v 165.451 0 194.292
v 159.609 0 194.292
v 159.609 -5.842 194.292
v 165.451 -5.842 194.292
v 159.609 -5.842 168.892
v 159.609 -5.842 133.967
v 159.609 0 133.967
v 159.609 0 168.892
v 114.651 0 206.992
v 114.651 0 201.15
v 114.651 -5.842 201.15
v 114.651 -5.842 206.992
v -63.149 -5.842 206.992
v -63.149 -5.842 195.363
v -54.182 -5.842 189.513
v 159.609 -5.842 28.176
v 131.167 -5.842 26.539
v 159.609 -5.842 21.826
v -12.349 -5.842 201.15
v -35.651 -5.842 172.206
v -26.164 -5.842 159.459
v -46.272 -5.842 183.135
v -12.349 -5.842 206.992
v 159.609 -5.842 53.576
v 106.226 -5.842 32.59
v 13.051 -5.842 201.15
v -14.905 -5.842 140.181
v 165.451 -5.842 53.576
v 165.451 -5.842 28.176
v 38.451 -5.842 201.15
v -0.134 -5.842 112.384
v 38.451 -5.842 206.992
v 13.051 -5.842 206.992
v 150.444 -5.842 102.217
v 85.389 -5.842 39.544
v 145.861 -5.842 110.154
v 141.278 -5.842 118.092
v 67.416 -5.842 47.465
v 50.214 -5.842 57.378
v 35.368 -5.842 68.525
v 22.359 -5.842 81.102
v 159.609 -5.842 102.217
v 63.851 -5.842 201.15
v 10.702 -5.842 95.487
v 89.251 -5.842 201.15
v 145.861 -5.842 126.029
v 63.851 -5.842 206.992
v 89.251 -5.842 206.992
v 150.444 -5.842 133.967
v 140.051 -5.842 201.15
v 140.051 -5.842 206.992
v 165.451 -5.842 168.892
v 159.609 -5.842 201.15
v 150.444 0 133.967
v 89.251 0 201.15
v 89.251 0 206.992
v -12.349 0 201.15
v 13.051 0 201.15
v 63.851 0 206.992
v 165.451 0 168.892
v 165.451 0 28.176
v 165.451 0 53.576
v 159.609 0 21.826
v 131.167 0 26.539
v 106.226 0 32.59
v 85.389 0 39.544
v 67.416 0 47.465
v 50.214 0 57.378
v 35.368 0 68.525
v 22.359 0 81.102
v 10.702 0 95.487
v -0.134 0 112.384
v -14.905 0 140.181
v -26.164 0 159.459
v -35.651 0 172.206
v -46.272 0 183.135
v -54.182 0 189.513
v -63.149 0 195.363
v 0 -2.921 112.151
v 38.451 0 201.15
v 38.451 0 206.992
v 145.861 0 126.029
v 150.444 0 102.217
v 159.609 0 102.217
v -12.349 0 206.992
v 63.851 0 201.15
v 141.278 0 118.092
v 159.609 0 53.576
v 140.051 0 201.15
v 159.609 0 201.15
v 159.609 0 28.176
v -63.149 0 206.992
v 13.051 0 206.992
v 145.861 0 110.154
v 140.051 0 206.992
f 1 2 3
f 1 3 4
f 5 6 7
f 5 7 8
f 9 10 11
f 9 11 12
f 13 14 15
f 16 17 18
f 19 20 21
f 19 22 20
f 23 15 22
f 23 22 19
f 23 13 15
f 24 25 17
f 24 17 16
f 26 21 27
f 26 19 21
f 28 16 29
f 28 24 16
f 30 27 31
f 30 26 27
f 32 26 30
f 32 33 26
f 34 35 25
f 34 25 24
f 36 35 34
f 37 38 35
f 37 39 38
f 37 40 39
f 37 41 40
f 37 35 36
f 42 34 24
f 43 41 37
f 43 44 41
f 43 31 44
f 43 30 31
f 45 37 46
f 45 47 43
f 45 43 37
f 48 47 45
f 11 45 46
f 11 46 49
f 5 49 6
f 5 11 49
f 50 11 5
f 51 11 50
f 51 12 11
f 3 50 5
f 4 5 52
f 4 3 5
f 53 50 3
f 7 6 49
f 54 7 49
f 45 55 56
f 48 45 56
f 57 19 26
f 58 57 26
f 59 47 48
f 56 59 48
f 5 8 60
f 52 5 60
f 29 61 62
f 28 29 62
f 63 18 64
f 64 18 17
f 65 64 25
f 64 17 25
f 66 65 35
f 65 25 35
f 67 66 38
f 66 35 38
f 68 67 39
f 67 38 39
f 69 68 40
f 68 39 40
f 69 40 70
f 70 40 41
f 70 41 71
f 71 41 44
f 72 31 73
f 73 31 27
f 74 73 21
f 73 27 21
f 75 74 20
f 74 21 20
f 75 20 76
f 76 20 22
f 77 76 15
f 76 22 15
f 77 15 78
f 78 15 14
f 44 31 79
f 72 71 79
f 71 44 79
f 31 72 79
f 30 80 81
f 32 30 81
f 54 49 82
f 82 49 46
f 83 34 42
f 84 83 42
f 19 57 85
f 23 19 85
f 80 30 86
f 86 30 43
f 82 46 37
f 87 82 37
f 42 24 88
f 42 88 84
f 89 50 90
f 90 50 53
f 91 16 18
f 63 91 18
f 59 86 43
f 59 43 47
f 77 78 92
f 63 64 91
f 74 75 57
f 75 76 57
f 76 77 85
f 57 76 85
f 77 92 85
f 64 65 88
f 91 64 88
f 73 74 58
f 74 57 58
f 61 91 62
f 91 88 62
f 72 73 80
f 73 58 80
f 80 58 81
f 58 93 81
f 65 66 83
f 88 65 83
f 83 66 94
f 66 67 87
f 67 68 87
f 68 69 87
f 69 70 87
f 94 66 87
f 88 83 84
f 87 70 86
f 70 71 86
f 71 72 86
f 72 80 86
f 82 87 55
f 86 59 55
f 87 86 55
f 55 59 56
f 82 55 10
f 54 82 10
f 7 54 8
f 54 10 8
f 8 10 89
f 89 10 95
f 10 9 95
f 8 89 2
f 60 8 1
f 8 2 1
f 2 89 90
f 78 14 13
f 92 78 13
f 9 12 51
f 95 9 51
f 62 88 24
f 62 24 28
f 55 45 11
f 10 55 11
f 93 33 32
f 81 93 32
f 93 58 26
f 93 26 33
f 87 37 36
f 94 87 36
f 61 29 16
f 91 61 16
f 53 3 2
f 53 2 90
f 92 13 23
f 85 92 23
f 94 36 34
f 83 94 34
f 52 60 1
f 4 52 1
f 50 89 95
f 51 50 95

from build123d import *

# Parameters (mm, degrees)
F0_W      = 279.4
F0_H      = 330.2
F1_DEPTH  = 5.842
F2_W      = 25.4
F2_H      = 5.842
F2_W_2    = 76.2
F2_W_3    = 5.842
F2_H_2    = 25.4
F2_H_3    = 38.1
F3_DEPTH  = 5.842
F5_W      = 5.842
F5_H      = 12.7
F6_DEPTH  = 5.842
F7_DEPTH  = 5.842
F8_W      = 5.842
F8_H      = 48.641
F8_H_2    = 34.925
F8_H_3    = 11.684
F9_DEPTH  = 5.842
F10_W     = 246.7240431406
F10_H     = 1.016
F11_DEPTH = 5.842
F12_W     = 25.4
F12_H     = 5.842
F12_W_2   = 19.558
F13_DEPTH = 5.842


with BuildPart() as f1:
    # F0 (on Front) → F1 (new body)
    with BuildSketch(Plane.XZ):
        with Locations((25.751306051, 40.8756073241)):
            Rectangle(F0_W, F0_H)
    extrude(amount=F1_DEPTH)

    # F2 (on face) → F3 (cut, through all)
    with BuildSketch(Plane.XZ.offset(5.842)):
        with Locations((152.751306051, -121.3033926759)):
            Rectangle(F2_W, F2_H)
        with Locations((101.951306051, -121.3033926759)):
            Rectangle(F2_W, F2_H)
        with Locations((51.151306051, -121.3033926759)):
            Rectangle(F2_W, F2_H)
        with Locations((0.351306051, -121.3033926759)):
            Rectangle(F2_W, F2_H)
        with Locations((-75.848693949, -121.3033926759)):
            Rectangle(F2_W_2, F2_H)
        with Locations((162.530306051, -86.1243926759)):
            Rectangle(F2_W_3, F2_H_2)
        with Locations((162.530306051, -28.9743926759)):
            Rectangle(F2_W_3, F2_H_3)
        with Locations((-111.027693949, -86.1243926759)):
            Rectangle(F2_W_3, F2_H_2)
        with Locations((-111.027693949, -35.3243926759)):
            Rectangle(F2_W_3, F2_H_2)
        with Locations((-111.027693949, 15.4756073241)):
            Rectangle(F2_W_3, F2_H_2)
        with Locations((-111.027693949, 66.2756073241)):
            Rectangle(F2_W_3, F2_H_2)
        with Locations((-111.027693949, 167.8756073241)):
            Rectangle(F2_W_3, F2_H_2)
        with Locations((-111.027693949, 117.0756073241)):
            Rectangle(F2_W_3, F2_H_2)
    extrude(amount=-F3_DEPTH, mode=Mode.SUBTRACT)

    # F5 (on face) → F6 (cut, through all)
    with BuildSketch(Plane.XZ.offset(5.842)):
        with Locations((162.530306051, 2.7756073241)):
            Rectangle(F5_W, F5_H)
    extrude(amount=-F6_DEPTH, mode=Mode.SUBTRACT)

    # F4 (on face) → F7 (cut, through all)
    with BuildSketch(Plane.XZ.offset(5.842)):
        with BuildLine():
            Line((165.451306051, 15.4756073241), (159.609306051, 15.4756073241))
            add(Edge.make_bspline(
                [(159.609306051, 15.4756073241), (73.376306051, 28.1756073241), (-24.3765935073, 60.3637718481), (-21.873693949, 193.2756073241), (-113.948693949, 205.9756073241)],
                knots=[0, 0, 0, 0, 0.507272, 1, 1, 1, 1], degree=3))
            Line((-113.948693949, 205.9756073241), (-113.948693949, 180.5756073241))
            Line((-113.948693949, 180.5756073241), (-108.106693949, 180.5756073241))
            Line((-108.106693949, 180.5756073241), (-108.106693949, 155.1756073241))
            Line((-108.106693949, 155.1756073241), (-113.948693949, 155.1756073241))
            Line((-113.948693949, 155.1756073241), (-113.948693949, 129.7756073241))
            Line((-113.948693949, 129.7756073241), (-108.106693949, 129.7756073241))
            Line((-108.106693949, 129.7756073241), (-108.106693949, 104.3756073241))
            Line((-108.106693949, 104.3756073241), (-113.948693949, 104.3756073241))
            Line((-113.948693949, 104.3756073241), (-113.948693949, 78.9756073241))
            Line((-113.948693949, 78.9756073241), (-108.106693949, 78.9756073241))
            Line((-108.106693949, 78.9756073241), (-108.106693949, 53.5756073241))
            Line((-108.106693949, 53.5756073241), (-113.948693949, 53.5756073241))
            Line((-113.948693949, 53.5756073241), (-113.948693949, 28.1756073241))
            Line((-113.948693949, 28.1756073241), (-108.106693949, 28.1756073241))
            Line((-108.106693949, 28.1756073241), (-108.106693949, 2.7756073241))
            Line((-108.106693949, 2.7756073241), (-113.948693949, 2.7756073241))
            Line((-113.948693949, 2.7756073241), (-113.948693949, -22.6243926759))
            Line((-113.948693949, -22.6243926759), (-108.106693949, -22.6243926759))
            Line((-108.106693949, -22.6243926759), (-108.106693949, -48.0243926759))
            Line((-108.106693949, -48.0243926759), (-113.948693949, -48.0243926759))
            Line((-113.948693949, -48.0243926759), (-113.948693949, -73.4243926759))
            Line((-113.948693949, -73.4243926759), (-108.106693949, -73.4243926759))
            Line((-108.106693949, -73.4243926759), (-108.106693949, -98.8243926759))
            Line((-108.106693949, -98.8243926759), (-113.948693949, -98.8243926759))
            Line((-113.948693949, -98.8243926759), (-113.948693949, -118.3823926759))
            Line((-113.948693949, -118.3823926759), (-37.748693949, -118.3823926759))
            Line((-37.748693949, -118.3823926759), (-37.748693949, -124.2243926759))
            Line((-37.748693949, -124.2243926759), (-12.348693949, -124.2243926759))
            Line((-12.348693949, -124.2243926759), (-12.348693949, -118.3823926759))
            Line((-12.348693949, -118.3823926759), (13.051306051, -118.3823926759))
            Line((13.051306051, -118.3823926759), (13.051306051, -124.2243926759))
            Line((13.051306051, -124.2243926759), (38.451306051, -124.2243926759))
            Line((38.451306051, -124.2243926759), (38.451306051, -118.3823926759))
            Line((38.451306051, -118.3823926759), (63.851306051, -118.3823926759))
            Line((63.851306051, -118.3823926759), (63.851306051, -124.2243926759))
            Line((63.851306051, -124.2243926759), (89.251306051, -124.2243926759))
            Line((89.251306051, -124.2243926759), (89.251306051, -118.3823926759))
            Line((89.251306051, -118.3823926759), (114.651306051, -118.3823926759))
            Line((114.651306051, -118.3823926759), (114.651306051, -124.2243926759))
            Line((114.651306051, -124.2243926759), (140.051306051, -124.2243926759))
            Line((140.051306051, -124.2243926759), (140.051306051, -118.3823926759))
            Line((140.051306051, -118.3823926759), (165.451306051, -118.3823926759))
            Line((165.451306051, -118.3823926759), (165.451306051, -98.8243926759))
            Line((165.451306051, -98.8243926759), (159.609306051, -98.8243926759))
            Line((159.609306051, -98.8243926759), (159.609306051, -73.4243926759))
            Line((159.609306051, -73.4243926759), (165.451306051, -73.4243926759))
            Line((165.451306051, -73.4243926759), (165.451306051, -48.0243926759))
            Line((165.451306051, -48.0243926759), (159.609306051, -48.0243926759))
            Line((159.609306051, -48.0243926759), (159.609306051, -9.9243926759))
            Line((159.609306051, -9.9243926759), (165.451306051, -9.9243926759))
            Line((165.451306051, -9.9243926759), (165.451306051, 15.4756073241))
        make_face()
        with BuildLine():
            add(Edge.make_bspline(
                [(159.609306051, 15.4756073241), (73.376306051, 28.1756073241), (-24.3765935073, 60.3637718481), (-21.873693949, 193.2756073241), (-113.948693949, 205.9756073241)],
                knots=[0, 0, 0, 0, 0.507272, 1, 1, 1, 1], degree=3))
            Line((159.609306051, 15.4756073241), (159.609306051, 21.8256073241))
            add(Edge.make_bspline(
                [(159.609306051, 21.8256073241), (63.851306051, 34.5256073241), (-5.6173037023, 95.4914607938), (-31.4644745687, 187.7697107475), (-87.114737086, 205.9756073241)],
                knots=[0, 0, 0, 0, 0.5236819738, 0.940243193, 0.940243193, 0.940243193, 0.940243193], degree=3))
            Line((-87.114737086, 205.9756073241), (-113.948693949, 205.9756073241))
        make_face()
    extrude(amount=-F7_DEPTH, mode=Mode.SUBTRACT)

    # F8 (on face) → F9 (cut, through all)
    with BuildSketch(Plane.XZ.offset(5.842)):
        Polygon((165.451306051, 15.4756073241), (165.451306051, 28.1756073241), (159.609306051, 28.1756073241), (159.609306051, 21.8256073241), (159.609306051, 15.4756073241), align=None)
        with Locations((162.530306051, 77.8961073241)):
            Rectangle(F8_W, F8_H)
        with BuildLine():
            Line((159.609306051, 102.2166073241), (165.451306051, 102.2166073241))
            Line((165.451306051, 102.2166073241), (165.451306051, 103.3306229057))
            ThreePointArc((165.451306051, 103.3306229057), (162.5829399691, 102.4975980153), (159.609306051, 102.2166073241))
        make_face()
        with BuildLine():
            ThreePointArc((145.861152343, 110.1541080567), (151.6718056847, 104.3434542505), (159.609306051, 102.2166073241))
            Line((159.609306051, 102.2166073241), (159.609306051, 133.9666073241))
            ThreePointArc((159.609306051, 133.9666073241), (151.6718056847, 131.8397603977), (145.861152343, 126.0291065915))
            ThreePointArc((145.861152343, 126.0291065915), (143.734306051, 118.0916073241), (145.861152343, 110.1541080567))
        make_face()
        with BuildLine():
            Line((150.4438705276, 102.2166073241), (159.609306051, 102.2166073241))
            ThreePointArc((159.609306051, 102.2166073241), (151.6718056847, 104.3434542505), (145.861152343, 110.1541080567))
            Line((145.861152343, 110.1541080567), (150.4438705276, 102.2166073241))
        make_face()
        with BuildLine():
            Line((159.609306051, 133.9666073241), (159.609306051, 102.2166073241))
            ThreePointArc((159.609306051, 102.2166073241), (162.5829399691, 102.4975980153), (165.451306051, 103.3306229057))
            Line((165.451306051, 103.3306229057), (165.451306051, 132.8525917425))
            ThreePointArc((165.451306051, 132.8525917425), (162.5829399691, 133.6856166328), (159.609306051, 133.9666073241))
        make_face()
        with BuildLine():
            Line((165.451306051, 133.9666073241), (159.609306051, 133.9666073241))
            ThreePointArc((159.609306051, 133.9666073241), (162.5829399691, 133.6856166328), (165.451306051, 132.8525917425))
            Line((165.451306051, 132.8525917425), (165.451306051, 133.9666073241))
        make_face()
        with BuildLine():
            ThreePointArc((145.861152343, 126.0291065915), (151.6718056847, 131.8397603977), (159.609306051, 133.9666073241))
            Line((159.609306051, 133.9666073241), (150.4438705276, 133.9666073241))
            Line((150.4438705276, 133.9666073241), (145.861152343, 126.0291065915))
        make_face()
        with Locations((162.530306051, 151.4291073241)):
            Rectangle(F8_W, F8_H_2)
        with BuildLine():
            Line((141.2784350042, 118.0916073241), (145.861152343, 110.1541080567))
            ThreePointArc((145.861152343, 110.1541080567), (143.734306051, 118.0916073241), (145.861152343, 126.0291065915))
            Line((145.861152343, 126.0291065915), (141.2784350042, 118.0916073241))
        make_face()
        with Locations((162.530306051, 200.1336073241)):
            Rectangle(F8_W, F8_H_3)
    extrude(amount=-F9_DEPTH, mode=Mode.SUBTRACT)

    # F10 (on face) → F11 (join, through all)
    with BuildSketch(Plane.XZ.offset(5.842)):
        with Locations((36.2472844807, 206.4836073241)):
            Rectangle(F10_W, F10_H)
    extrude(amount=-F11_DEPTH)

    # F12 (on face) → F13 (cut, through all)
    with BuildSketch(Plane.XZ.offset(5.842)):
        with Locations((51.151306051, 204.0706073241)):
            Rectangle(F12_W, F12_H)
        with Locations((101.951306051, 204.0706073241)):
            Rectangle(F12_W, F12_H)
        with Locations((149.830306051, 204.0706073241)):
            Rectangle(F12_W_2, F12_H)
        with BuildLine():
            add(Edge.make_bspline(
                [(-64.0656111495, 195.8912068503), (-64.4986133811, 197.8821506555), (-64.5462177809, 200.9608220943), (-64.8897370896, 206.9916073241)],
                knots=[0.7783755915, 0.7783755915, 0.7783755915, 0.7783755915, 1, 1, 1, 1], degree=3))
            Line((-64.8897370896, 206.9916073241), (-87.1147370896, 206.9916073241))
            Line((-87.1147370896, 206.9916073241), (-87.1147370896, 205.9756073241))
            add(Edge.make_bspline(
                [(-64.0656111419, 195.8912068549), (-70.8038372609, 199.7329606353), (-78.4197996839, 203.1310721158), (-87.114737086, 205.9756073241)],
                knots=[0.8751586172, 0.8751586172, 0.8751586172, 0.8751586172, 0.940243193, 0.940243193, 0.940243193, 0.940243193], degree=3))
        make_face()
        with Locations((0.351306051, 204.0706073241)):
            Rectangle(F12_W, F12_H)
        with BuildLine():
            Line((-63.148693949, 195.362557311), (-63.148693949, 206.9916073241))
            Line((-63.148693949, 206.9916073241), (-64.8897370896, 206.9916073241))
            add(Edge.make_bspline(
                [(-64.0656111495, 195.8912068503), (-64.4986133811, 197.8821506555), (-64.5462177809, 200.9608220943), (-64.8897370896, 206.9916073241)],
                knots=[0.7783755915, 0.7783755915, 0.7783755915, 0.7783755915, 1, 1, 1, 1], degree=3))
            add(Edge.make_bspline(
                [(-63.148693949, 195.362557311), (-63.4525182871, 195.5396905387), (-63.7581509788, 195.7159105346), (-64.0656111419, 195.8912068549)],
                knots=[0.8721888572, 0.8721888572, 0.8721888572, 0.8721888572, 0.8751586172, 0.8751586172, 0.8751586172, 0.8751586172], degree=3))
        make_face()
    extrude(amount=-F13_DEPTH, mode=Mode.SUBTRACT)


solid = f1.part
